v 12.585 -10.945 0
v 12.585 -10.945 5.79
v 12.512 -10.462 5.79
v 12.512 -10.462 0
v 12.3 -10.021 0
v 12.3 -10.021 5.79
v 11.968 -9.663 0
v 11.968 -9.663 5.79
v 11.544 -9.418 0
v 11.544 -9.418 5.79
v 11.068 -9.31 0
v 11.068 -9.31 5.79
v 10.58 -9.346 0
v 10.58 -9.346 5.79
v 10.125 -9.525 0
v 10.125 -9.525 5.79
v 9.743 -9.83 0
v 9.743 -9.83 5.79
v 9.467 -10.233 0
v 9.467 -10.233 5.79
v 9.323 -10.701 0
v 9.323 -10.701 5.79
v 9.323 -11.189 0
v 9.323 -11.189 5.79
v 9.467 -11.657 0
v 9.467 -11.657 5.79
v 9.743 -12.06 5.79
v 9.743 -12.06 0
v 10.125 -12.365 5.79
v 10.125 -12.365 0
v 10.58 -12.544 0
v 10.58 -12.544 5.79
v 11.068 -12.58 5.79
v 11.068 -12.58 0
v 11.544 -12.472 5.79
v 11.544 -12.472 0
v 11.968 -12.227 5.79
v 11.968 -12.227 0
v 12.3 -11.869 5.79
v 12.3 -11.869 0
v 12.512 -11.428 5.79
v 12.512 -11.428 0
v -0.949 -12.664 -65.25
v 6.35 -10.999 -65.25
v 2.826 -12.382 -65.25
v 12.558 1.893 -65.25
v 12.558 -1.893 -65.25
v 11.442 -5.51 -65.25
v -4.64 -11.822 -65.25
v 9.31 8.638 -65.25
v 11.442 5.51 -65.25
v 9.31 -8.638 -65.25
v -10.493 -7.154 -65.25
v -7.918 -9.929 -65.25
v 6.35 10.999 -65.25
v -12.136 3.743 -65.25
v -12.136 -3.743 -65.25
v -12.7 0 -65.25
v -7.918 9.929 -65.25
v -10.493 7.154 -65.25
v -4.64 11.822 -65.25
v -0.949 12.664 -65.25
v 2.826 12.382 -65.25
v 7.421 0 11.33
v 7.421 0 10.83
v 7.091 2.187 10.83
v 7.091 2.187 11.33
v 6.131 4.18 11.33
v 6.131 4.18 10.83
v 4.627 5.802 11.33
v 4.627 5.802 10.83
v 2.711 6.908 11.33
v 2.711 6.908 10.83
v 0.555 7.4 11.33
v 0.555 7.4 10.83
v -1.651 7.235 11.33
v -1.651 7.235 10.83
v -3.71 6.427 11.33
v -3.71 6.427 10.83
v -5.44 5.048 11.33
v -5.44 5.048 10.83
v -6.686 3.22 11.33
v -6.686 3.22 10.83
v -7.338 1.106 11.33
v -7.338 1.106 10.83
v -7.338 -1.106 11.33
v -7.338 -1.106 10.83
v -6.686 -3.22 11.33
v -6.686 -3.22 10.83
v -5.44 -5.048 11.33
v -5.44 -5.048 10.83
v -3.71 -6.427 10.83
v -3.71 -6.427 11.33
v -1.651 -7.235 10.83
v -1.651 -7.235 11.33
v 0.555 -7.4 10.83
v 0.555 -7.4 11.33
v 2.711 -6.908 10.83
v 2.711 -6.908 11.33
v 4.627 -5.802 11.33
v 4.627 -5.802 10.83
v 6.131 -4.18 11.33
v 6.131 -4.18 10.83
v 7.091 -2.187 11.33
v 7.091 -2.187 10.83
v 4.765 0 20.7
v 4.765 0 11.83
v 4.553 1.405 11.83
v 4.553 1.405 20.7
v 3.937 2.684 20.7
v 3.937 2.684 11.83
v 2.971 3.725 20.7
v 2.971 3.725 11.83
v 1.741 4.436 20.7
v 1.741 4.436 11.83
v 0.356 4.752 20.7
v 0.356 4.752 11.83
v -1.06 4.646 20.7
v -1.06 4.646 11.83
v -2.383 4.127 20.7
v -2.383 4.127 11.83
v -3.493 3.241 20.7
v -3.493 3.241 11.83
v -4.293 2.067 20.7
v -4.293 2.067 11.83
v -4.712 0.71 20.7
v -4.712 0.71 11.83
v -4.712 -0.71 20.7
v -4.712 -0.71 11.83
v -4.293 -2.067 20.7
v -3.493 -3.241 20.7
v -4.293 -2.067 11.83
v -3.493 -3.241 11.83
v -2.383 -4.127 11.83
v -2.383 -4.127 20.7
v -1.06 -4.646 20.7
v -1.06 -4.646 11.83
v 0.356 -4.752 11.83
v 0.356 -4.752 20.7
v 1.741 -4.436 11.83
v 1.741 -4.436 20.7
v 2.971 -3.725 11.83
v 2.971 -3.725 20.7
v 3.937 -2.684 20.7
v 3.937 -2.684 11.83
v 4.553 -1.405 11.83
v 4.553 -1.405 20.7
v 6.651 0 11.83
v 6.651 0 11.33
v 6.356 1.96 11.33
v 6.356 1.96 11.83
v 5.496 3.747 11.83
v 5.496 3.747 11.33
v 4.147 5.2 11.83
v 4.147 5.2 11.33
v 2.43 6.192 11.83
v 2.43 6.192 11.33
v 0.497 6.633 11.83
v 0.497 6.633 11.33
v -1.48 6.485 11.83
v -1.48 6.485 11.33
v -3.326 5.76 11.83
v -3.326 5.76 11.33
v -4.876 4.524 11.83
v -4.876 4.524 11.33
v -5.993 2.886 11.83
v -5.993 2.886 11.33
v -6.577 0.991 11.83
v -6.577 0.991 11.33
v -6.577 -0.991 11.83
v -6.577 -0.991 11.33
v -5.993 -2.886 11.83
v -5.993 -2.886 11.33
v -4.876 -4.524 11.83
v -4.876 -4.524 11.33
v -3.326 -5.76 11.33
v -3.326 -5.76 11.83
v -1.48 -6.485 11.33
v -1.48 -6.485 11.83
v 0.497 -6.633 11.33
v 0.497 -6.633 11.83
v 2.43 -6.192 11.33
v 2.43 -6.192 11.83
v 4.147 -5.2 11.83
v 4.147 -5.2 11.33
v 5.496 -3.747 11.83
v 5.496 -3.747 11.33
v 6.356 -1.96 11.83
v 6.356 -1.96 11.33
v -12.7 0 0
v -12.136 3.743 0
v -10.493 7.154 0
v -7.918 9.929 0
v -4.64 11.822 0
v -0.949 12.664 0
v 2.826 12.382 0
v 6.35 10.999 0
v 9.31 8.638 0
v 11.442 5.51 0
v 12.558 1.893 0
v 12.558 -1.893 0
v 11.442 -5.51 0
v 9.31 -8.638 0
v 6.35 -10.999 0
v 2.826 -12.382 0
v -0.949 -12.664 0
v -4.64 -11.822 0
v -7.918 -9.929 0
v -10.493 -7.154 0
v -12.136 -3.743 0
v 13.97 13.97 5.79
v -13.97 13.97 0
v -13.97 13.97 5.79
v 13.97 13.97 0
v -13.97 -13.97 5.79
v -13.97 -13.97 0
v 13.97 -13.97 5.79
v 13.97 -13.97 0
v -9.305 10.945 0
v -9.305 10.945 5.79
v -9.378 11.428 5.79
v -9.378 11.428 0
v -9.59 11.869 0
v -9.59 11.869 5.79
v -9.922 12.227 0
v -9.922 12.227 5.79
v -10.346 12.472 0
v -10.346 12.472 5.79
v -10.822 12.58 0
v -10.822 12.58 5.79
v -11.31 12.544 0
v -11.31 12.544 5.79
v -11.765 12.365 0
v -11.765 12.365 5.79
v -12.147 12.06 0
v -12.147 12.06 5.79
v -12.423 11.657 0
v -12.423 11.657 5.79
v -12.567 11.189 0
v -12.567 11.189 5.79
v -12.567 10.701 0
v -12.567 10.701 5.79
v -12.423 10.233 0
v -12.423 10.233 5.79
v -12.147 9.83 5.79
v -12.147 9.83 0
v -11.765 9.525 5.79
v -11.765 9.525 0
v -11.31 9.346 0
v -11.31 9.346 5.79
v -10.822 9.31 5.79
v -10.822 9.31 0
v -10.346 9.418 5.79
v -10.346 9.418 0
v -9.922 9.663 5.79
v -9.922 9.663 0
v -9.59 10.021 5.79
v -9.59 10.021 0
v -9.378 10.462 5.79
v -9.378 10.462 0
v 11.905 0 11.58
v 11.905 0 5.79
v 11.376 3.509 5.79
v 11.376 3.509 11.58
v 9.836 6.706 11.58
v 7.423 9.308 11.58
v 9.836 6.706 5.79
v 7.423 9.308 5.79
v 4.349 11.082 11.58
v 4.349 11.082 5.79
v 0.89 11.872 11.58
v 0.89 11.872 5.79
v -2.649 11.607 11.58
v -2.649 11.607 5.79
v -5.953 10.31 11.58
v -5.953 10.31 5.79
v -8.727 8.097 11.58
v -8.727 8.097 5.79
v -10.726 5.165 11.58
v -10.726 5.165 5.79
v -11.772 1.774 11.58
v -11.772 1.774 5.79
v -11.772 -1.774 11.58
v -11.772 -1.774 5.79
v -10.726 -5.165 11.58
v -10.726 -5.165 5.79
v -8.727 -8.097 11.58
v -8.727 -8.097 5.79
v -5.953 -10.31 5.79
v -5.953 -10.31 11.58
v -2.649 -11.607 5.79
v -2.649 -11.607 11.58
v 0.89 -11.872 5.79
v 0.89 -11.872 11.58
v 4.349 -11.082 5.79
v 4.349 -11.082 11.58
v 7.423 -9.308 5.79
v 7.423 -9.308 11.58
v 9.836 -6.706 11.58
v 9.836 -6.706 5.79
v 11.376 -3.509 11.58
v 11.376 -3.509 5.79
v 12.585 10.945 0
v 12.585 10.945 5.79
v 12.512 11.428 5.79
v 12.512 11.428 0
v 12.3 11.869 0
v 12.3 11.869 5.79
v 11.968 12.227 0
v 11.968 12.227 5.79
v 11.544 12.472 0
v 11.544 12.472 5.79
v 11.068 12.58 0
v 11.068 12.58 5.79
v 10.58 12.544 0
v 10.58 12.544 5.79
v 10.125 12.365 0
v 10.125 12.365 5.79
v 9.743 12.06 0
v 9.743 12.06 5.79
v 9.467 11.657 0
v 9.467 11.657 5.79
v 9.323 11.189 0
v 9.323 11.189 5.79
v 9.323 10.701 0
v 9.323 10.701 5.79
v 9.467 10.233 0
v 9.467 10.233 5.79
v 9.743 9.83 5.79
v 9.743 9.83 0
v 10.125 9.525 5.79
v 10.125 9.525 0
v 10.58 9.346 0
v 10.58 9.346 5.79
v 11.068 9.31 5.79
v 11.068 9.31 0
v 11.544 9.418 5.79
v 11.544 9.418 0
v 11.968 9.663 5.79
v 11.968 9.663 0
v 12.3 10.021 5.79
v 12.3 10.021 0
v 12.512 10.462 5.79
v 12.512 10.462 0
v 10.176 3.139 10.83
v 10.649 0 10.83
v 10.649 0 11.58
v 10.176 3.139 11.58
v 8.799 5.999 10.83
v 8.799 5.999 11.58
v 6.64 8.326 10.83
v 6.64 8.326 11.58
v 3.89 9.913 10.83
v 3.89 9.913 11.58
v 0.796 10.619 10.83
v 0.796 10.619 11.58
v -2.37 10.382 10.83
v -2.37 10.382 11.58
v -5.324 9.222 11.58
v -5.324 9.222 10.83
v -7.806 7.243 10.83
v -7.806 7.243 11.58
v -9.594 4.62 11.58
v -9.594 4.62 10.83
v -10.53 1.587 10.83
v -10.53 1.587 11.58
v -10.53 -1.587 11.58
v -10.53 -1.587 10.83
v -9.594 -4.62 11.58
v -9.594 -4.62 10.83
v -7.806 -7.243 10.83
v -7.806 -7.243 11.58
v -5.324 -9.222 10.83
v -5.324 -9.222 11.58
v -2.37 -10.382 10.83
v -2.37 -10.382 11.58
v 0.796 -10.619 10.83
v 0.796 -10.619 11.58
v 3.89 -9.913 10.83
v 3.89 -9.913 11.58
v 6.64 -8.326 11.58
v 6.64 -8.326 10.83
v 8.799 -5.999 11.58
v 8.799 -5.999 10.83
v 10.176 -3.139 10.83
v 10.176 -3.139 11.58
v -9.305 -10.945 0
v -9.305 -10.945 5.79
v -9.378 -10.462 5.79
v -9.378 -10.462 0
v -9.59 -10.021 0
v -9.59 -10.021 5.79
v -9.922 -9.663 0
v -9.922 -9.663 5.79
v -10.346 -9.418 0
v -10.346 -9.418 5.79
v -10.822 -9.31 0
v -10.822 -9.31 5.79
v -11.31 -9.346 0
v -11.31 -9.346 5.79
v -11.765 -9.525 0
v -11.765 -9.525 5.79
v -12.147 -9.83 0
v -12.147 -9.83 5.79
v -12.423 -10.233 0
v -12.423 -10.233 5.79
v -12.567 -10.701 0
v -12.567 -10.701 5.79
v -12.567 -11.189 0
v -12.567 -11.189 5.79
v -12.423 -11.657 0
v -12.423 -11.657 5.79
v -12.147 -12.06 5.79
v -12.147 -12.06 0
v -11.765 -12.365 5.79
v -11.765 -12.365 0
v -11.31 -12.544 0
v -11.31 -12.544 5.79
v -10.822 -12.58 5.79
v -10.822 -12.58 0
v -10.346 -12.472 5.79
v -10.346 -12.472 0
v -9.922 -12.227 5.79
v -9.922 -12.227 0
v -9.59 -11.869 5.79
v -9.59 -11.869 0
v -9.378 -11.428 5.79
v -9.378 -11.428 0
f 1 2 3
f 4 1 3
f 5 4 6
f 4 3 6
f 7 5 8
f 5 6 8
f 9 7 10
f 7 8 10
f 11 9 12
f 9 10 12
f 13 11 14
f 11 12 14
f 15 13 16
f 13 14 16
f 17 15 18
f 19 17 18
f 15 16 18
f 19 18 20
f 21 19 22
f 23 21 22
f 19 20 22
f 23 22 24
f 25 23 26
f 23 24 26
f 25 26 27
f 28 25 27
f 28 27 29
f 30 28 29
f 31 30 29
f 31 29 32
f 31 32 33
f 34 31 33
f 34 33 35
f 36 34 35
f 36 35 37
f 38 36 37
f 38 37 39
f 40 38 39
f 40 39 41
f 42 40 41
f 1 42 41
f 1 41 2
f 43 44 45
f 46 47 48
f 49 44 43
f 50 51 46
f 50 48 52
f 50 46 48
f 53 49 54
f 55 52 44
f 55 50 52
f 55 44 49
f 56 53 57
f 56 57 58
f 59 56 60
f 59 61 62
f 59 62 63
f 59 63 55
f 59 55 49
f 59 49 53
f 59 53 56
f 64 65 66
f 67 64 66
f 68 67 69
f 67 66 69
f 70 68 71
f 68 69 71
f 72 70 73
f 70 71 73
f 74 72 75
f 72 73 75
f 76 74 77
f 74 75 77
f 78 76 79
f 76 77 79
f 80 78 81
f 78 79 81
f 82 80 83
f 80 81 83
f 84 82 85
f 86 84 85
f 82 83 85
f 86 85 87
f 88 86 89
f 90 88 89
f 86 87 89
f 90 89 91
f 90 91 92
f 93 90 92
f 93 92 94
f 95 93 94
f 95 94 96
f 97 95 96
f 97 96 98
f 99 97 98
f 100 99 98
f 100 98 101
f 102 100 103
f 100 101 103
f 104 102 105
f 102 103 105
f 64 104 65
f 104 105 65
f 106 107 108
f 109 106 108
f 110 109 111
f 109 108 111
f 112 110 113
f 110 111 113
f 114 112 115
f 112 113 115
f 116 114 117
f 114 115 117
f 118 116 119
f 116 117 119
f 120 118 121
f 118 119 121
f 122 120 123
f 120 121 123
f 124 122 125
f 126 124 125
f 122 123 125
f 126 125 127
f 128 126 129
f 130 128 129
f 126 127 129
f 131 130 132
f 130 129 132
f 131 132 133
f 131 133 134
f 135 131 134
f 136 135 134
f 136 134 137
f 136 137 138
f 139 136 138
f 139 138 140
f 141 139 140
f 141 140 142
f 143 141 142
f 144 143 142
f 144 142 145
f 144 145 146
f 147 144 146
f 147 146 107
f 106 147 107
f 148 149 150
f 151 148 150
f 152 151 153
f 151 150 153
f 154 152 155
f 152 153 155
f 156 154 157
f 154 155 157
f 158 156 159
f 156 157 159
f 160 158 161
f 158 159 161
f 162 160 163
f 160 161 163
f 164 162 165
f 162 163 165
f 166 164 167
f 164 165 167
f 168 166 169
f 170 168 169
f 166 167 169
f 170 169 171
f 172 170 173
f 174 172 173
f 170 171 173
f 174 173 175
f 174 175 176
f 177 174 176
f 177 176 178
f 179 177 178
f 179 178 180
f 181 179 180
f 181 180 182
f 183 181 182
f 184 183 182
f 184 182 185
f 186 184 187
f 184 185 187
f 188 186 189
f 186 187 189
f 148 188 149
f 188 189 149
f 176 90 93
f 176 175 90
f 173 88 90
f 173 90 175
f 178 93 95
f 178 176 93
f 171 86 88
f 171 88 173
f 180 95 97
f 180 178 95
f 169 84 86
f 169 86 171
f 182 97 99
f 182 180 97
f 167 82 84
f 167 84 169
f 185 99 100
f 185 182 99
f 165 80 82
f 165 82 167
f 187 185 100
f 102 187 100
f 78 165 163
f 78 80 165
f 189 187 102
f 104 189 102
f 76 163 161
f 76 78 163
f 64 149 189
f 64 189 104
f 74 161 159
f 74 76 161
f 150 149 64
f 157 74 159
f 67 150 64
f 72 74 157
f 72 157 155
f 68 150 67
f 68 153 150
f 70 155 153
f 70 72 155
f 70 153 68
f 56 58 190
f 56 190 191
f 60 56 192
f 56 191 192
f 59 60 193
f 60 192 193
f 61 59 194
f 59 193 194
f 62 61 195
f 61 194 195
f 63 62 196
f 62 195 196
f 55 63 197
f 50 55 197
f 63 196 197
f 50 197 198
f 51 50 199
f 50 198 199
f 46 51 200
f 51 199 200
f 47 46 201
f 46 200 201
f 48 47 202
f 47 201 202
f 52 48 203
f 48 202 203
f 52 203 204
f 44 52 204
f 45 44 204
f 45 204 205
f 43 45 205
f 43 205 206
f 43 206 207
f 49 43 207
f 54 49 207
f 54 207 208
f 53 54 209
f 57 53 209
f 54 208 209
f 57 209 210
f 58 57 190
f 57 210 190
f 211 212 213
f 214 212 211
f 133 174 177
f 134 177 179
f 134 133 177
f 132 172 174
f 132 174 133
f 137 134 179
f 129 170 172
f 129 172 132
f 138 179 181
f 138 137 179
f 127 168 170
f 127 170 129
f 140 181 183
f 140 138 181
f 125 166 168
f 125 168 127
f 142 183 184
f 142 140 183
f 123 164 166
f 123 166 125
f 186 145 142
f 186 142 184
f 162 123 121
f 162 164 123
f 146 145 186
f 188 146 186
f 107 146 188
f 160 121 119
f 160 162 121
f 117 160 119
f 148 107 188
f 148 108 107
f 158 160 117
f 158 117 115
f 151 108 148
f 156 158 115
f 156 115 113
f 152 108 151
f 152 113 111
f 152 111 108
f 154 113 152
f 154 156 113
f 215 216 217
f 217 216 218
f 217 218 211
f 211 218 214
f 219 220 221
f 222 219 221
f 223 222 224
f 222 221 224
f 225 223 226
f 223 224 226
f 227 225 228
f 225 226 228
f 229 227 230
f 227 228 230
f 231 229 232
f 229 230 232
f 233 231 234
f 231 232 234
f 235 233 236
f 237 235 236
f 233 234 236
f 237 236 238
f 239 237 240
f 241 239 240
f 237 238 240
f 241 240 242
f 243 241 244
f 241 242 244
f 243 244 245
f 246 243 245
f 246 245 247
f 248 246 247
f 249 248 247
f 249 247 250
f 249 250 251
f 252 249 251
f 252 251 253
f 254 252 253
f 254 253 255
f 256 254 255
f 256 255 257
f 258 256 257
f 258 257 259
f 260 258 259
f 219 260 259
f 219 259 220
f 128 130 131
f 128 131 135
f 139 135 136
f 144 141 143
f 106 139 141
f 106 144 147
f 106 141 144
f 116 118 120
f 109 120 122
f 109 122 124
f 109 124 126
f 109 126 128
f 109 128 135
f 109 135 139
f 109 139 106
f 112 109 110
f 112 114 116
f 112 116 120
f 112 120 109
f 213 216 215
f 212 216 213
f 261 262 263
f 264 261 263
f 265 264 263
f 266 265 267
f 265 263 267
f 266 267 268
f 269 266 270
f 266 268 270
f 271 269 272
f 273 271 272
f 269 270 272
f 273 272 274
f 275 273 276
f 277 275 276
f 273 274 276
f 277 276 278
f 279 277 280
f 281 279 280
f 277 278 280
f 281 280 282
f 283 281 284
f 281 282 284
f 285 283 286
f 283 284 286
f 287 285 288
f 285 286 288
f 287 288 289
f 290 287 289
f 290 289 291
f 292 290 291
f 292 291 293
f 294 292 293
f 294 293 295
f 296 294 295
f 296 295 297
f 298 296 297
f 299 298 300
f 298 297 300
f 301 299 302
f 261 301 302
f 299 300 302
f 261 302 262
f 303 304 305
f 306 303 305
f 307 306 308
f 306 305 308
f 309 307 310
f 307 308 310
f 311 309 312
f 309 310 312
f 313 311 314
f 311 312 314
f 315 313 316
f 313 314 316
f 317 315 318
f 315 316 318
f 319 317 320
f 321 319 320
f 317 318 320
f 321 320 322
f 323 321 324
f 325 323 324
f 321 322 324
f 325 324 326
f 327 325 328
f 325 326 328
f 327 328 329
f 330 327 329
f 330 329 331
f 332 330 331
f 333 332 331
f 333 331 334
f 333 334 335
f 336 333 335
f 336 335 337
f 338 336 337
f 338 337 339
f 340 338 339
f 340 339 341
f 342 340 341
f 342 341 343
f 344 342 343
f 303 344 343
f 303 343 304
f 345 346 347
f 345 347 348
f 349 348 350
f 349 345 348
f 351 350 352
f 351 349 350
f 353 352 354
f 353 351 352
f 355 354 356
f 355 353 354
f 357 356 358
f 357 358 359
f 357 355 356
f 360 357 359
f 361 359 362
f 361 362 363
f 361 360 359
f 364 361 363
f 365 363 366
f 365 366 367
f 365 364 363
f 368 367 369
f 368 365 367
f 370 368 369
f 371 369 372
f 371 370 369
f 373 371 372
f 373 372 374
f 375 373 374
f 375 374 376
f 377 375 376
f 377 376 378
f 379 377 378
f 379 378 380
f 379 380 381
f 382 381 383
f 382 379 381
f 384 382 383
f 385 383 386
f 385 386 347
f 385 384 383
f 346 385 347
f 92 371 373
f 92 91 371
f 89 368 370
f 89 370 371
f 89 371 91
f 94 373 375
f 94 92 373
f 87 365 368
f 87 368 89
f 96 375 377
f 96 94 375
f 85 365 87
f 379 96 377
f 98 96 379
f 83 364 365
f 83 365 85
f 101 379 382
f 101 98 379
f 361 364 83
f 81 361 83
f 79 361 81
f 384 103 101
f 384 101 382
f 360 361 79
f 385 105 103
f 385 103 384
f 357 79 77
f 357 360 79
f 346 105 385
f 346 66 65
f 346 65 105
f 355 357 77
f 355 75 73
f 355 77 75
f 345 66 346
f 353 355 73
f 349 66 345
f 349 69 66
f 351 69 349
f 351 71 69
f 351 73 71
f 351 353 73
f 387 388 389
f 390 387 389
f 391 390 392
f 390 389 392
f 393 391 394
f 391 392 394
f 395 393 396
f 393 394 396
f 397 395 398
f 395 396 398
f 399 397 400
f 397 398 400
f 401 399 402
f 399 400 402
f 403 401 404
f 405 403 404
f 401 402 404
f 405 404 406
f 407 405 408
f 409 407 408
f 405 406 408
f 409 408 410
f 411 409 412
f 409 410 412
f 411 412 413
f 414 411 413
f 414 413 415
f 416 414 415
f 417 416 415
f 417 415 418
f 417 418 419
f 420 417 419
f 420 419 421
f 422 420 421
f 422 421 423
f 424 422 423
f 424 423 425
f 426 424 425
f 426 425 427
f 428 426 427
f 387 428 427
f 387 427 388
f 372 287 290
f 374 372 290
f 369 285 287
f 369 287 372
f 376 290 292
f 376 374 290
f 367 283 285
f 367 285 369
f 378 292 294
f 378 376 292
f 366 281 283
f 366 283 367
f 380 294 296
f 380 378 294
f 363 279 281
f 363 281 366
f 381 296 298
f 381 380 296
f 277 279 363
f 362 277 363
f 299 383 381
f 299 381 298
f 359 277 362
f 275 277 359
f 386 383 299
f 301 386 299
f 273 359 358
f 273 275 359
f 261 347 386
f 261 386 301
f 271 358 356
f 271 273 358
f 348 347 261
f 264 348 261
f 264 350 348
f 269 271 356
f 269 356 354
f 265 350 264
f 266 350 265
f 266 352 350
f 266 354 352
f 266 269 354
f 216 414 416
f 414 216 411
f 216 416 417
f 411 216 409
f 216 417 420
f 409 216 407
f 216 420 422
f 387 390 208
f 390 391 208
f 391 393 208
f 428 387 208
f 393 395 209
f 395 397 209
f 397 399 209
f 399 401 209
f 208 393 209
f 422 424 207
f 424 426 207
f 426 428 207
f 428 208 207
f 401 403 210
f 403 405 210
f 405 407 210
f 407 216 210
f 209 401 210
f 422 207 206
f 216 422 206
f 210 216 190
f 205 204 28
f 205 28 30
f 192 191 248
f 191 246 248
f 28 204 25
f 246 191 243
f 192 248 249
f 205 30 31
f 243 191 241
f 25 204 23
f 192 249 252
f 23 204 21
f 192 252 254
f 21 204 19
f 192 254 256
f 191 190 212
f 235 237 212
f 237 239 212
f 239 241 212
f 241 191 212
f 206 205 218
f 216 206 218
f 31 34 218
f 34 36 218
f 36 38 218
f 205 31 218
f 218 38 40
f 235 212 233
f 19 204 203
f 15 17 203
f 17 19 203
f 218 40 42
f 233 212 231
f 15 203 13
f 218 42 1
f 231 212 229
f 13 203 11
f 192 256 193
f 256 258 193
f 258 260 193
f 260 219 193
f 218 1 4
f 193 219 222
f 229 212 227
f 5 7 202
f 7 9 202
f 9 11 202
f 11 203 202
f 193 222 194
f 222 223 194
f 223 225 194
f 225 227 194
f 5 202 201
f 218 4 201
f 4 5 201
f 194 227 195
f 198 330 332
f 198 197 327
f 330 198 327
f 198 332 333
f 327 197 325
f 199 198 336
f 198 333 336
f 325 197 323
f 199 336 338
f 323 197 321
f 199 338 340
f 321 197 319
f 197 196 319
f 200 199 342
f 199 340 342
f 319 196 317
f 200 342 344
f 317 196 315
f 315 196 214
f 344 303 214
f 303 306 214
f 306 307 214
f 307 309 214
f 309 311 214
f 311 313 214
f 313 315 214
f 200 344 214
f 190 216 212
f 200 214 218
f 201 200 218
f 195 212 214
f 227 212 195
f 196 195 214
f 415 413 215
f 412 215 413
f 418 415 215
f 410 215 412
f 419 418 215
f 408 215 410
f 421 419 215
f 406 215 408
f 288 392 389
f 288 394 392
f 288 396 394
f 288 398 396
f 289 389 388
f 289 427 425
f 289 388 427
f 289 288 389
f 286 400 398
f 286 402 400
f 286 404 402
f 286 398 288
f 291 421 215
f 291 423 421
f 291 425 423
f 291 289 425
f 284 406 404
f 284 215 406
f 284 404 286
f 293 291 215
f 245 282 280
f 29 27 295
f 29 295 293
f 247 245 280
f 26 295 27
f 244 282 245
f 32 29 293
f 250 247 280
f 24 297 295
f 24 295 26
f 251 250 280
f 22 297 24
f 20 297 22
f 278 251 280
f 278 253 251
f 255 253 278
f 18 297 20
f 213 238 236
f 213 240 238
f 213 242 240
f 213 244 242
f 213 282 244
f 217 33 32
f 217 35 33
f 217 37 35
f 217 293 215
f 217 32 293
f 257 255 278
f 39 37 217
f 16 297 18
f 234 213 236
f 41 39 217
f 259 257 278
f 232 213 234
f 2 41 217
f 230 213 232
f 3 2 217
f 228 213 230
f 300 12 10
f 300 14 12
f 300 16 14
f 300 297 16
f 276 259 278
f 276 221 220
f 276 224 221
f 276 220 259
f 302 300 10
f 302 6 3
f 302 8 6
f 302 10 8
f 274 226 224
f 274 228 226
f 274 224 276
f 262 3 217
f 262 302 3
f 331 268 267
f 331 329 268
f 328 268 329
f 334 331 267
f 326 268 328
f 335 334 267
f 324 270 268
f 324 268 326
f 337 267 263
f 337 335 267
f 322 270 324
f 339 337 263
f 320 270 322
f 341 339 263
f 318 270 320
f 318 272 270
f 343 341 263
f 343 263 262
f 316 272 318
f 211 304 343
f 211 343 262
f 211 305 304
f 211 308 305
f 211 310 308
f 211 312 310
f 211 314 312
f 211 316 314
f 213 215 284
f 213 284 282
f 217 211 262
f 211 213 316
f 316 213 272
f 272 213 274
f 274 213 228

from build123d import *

# Parameters (mm, degrees)
SKETCH2_W           = 27.94
SKETCH2_H           = 27.94
BOSS_EXTRUDE1_DEPTH = 5.79
SKETCH3_R           = 11.905
BOSS_EXTRUDE2_DEPTH = 5.79
SKETCH4_R           = 4.765
BOSS_EXTRUDE3_DEPTH = 9.12
SKETCH5_R           = 12.7
BOSS_EXTRUDE4_DEPTH = 65.25
CUT_EXTRUDE1_START  = -0.75
SKETCH6_R           = 10.648931608
SKETCH6_R_2         = 4.765
CUT_EXTRUDE1_DEPTH  = 0.75
SKETCH7_R           = 7.420951144
BOSS_EXTRUDE5_DEPTH = 0.5
SKETCH8_R           = 6.651278865
BOSS_EXTRUDE6_DEPTH = 0.5
SKETCH9_R           = 1.64
CUT_EXTRUDE2_DEPTH  = 10.5


with BuildPart() as part:
    # Sketch2 → Boss-Extrude1 (new body)
    with BuildSketch(Plane.XY):
        Rectangle(SKETCH2_W, SKETCH2_H)
    extrude(amount=BOSS_EXTRUDE1_DEPTH)

    # Sketch3 → Boss-Extrude2 (add)
    with BuildSketch(Plane.XY.offset(5.79)):
        Circle(SKETCH3_R)
    extrude(amount=BOSS_EXTRUDE2_DEPTH)

    # Sketch4 → Boss-Extrude3 (add)
    with BuildSketch(Plane.XY.offset(11.58)):
        Circle(SKETCH4_R)
    extrude(amount=BOSS_EXTRUDE3_DEPTH)

    # Sketch5 → Boss-Extrude4 (add)
    with BuildSketch(Plane(origin=(0, 0, 0), x_dir=(-1, 0, 0), z_dir=(0, 0, -1))):
        Circle(SKETCH5_R)
    extrude(amount=BOSS_EXTRUDE4_DEPTH)

    # Sketch6 → Cut-Extrude1 (cut)
    with BuildSketch(Plane.XY.offset(11.58).offset(CUT_EXTRUDE1_START)):
        Circle(SKETCH6_R)
        Circle(SKETCH6_R_2, mode=Mode.SUBTRACT)
    extrude(amount=CUT_EXTRUDE1_DEPTH, mode=Mode.SUBTRACT)

    # Sketch7 → Boss-Extrude5 (add)
    with BuildSketch(Plane.XY.offset(10.83)):
        Circle(SKETCH7_R)
    extrude(amount=BOSS_EXTRUDE5_DEPTH)

    # Sketch8 → Boss-Extrude6 (add)
    with BuildSketch(Plane.XY.offset(11.33)):
        Circle(SKETCH8_R)
    extrude(amount=BOSS_EXTRUDE6_DEPTH)

    # Sketch9 → Cut-Extrude2 (cut)
    with BuildSketch(Plane.XY.offset(5.79)):
        with Locations((-10.945, 10.945)):
            Circle(SKETCH9_R)
        with Locations((10.945, 10.945)):
            Circle(SKETCH9_R)
        with Locations((10.945, -10.945)):
            Circle(SKETCH9_R)
        with Locations((-10.945, -10.945)):
            Circle(SKETCH9_R)
    extrude(amount=-CUT_EXTRUDE2_DEPTH, mode=Mode.SUBTRACT)


solid = part.part
